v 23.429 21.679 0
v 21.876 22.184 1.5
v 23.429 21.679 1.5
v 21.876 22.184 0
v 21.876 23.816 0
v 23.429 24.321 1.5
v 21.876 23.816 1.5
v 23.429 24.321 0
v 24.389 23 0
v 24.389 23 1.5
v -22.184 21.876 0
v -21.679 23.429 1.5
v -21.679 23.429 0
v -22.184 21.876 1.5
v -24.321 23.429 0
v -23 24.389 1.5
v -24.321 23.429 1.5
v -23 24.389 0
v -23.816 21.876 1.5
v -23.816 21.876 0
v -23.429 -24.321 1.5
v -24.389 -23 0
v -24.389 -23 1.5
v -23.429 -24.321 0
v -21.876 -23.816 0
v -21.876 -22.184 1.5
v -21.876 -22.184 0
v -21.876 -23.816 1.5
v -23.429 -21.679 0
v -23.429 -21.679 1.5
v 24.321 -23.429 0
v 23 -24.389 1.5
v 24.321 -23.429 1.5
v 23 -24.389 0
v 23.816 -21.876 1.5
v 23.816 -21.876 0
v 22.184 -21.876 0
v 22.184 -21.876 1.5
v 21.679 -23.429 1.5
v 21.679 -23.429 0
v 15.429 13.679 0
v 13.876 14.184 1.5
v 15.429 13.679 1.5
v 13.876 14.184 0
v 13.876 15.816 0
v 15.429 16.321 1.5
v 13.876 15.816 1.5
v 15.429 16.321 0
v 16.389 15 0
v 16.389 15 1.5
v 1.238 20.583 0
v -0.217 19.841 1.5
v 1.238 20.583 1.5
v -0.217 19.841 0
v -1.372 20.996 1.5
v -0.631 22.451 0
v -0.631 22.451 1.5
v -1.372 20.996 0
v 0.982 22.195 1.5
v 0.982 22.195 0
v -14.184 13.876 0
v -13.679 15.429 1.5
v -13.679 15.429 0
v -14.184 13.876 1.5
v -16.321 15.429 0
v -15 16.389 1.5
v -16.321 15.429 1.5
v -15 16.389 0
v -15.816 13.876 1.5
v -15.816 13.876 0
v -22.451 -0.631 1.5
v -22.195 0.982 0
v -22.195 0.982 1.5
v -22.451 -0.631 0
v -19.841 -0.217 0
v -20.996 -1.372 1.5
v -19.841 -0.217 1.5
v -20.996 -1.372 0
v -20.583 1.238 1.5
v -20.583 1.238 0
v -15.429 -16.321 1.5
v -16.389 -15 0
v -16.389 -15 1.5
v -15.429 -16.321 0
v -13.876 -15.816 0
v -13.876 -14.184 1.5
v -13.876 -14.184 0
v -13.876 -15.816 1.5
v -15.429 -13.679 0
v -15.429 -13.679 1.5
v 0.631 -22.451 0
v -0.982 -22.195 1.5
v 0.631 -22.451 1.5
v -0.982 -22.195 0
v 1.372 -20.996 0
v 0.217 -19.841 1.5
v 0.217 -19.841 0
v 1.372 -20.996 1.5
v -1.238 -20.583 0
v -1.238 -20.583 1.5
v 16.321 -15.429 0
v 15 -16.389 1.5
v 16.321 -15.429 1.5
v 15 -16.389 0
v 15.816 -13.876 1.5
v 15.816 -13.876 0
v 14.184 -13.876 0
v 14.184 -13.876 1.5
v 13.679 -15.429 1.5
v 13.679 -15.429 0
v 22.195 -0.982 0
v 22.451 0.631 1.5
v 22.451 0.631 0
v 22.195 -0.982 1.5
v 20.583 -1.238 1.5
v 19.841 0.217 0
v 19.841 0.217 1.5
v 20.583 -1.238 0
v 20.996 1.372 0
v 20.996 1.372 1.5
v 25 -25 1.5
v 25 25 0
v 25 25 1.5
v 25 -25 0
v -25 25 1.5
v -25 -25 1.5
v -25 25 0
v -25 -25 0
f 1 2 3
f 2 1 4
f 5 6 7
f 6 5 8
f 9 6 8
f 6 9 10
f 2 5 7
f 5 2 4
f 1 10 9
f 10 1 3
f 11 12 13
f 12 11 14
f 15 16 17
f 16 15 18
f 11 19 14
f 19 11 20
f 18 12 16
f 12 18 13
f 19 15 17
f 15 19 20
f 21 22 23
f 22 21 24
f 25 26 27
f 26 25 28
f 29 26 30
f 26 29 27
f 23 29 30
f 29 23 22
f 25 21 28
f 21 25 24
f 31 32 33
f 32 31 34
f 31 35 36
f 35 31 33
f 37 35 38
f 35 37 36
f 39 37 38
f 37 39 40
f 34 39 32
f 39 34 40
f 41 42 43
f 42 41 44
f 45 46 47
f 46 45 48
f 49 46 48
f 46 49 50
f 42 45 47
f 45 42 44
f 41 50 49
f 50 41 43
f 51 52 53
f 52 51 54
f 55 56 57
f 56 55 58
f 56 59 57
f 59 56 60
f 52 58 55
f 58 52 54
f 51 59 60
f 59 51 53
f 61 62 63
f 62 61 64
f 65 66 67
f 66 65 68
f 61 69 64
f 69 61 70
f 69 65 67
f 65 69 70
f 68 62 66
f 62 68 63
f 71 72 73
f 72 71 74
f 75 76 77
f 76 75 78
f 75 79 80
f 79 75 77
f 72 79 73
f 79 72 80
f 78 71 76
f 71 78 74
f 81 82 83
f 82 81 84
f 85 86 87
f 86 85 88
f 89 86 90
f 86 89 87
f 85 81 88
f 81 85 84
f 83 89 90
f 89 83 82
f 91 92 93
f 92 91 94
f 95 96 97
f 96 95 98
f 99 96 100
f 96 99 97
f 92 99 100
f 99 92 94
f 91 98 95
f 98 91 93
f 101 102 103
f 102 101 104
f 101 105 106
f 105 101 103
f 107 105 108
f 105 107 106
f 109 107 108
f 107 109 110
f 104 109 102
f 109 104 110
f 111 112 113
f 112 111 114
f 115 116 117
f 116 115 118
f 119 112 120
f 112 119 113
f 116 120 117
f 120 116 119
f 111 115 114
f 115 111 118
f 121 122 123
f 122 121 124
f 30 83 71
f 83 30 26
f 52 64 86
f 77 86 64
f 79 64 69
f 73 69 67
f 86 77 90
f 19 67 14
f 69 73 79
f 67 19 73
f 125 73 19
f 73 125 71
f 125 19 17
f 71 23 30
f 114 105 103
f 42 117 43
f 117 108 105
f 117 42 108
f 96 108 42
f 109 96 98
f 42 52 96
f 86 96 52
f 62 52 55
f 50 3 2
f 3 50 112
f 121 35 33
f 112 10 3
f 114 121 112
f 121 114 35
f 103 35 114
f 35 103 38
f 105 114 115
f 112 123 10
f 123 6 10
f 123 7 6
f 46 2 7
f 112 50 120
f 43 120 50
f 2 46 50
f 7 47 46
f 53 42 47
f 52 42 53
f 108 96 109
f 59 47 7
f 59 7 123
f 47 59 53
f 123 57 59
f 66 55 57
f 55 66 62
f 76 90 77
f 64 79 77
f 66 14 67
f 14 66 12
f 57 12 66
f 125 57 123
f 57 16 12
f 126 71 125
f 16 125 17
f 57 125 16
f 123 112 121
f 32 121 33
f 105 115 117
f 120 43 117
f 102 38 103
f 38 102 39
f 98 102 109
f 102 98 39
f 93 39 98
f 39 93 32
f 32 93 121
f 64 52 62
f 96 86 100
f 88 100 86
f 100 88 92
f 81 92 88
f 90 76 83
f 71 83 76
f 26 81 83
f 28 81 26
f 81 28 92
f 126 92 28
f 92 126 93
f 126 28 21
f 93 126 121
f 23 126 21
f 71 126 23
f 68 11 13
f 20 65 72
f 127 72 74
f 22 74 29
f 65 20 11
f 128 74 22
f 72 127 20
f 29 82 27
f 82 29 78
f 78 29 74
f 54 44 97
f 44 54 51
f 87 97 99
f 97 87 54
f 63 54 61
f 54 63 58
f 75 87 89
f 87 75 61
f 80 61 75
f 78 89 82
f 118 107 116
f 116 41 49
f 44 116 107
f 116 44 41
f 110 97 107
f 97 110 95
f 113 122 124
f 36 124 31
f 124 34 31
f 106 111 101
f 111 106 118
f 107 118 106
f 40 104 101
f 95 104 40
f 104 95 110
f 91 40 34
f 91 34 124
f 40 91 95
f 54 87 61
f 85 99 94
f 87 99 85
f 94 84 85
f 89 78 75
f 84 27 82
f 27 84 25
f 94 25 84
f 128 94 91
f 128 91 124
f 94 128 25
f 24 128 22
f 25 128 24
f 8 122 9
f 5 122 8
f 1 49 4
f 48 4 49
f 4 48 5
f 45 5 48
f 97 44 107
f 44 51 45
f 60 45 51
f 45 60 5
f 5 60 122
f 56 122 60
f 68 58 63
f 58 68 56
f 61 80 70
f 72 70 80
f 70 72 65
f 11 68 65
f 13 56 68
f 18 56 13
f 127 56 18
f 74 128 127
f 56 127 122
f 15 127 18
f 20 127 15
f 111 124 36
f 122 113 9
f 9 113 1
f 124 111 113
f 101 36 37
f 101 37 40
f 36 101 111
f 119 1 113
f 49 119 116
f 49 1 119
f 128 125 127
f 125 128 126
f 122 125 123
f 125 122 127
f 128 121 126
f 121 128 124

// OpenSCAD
//----------------------------------------------------------------------
// PDB sized plate
//----------------------------------------------------------------------

Wid=50;
Ht=1.5;
EdgeGap=2;

SWid=30;
SEdgeGap=2;

DrillSz=7/64*25.4/2;

SRad2=SWid/2;
Rad=Wid/2;

//----------------------------------------------------------------------

module plate() {
    difference() {
        // plate
        translate([-Wid/2,-Wid/2,0])
            cube([Wid,Wid,Ht]);

        // edge holes
        for (i = [0:3]) {
            rotate(90*i) {
                translate([Rad-EdgeGap,Rad-EdgeGap,-1])
                   cylinder(h=Ht+2,r=DrillSz);
            }
        }

        // inner holes
        for (i = [0:7]) {
            rotate(45*i) {
                translate([SRad2,SRad2,-1])
                   cylinder(h=Ht+2,r=DrillSz);
            }
        }

    }
}

BedWid=285;
BedDep=153;
Gap=5;

module several(a,b) {
    translate([-BedWid/2,-BedDep/2,0]) {
        for (a0=[0:a-1]) {
            for (b0=[0:b-1]) {
                translate([a0*(Wid+Gap),b0*(Wid+Gap),0])
                    plate();
            }
        }
    }
}

plate();
//several(3,2);
